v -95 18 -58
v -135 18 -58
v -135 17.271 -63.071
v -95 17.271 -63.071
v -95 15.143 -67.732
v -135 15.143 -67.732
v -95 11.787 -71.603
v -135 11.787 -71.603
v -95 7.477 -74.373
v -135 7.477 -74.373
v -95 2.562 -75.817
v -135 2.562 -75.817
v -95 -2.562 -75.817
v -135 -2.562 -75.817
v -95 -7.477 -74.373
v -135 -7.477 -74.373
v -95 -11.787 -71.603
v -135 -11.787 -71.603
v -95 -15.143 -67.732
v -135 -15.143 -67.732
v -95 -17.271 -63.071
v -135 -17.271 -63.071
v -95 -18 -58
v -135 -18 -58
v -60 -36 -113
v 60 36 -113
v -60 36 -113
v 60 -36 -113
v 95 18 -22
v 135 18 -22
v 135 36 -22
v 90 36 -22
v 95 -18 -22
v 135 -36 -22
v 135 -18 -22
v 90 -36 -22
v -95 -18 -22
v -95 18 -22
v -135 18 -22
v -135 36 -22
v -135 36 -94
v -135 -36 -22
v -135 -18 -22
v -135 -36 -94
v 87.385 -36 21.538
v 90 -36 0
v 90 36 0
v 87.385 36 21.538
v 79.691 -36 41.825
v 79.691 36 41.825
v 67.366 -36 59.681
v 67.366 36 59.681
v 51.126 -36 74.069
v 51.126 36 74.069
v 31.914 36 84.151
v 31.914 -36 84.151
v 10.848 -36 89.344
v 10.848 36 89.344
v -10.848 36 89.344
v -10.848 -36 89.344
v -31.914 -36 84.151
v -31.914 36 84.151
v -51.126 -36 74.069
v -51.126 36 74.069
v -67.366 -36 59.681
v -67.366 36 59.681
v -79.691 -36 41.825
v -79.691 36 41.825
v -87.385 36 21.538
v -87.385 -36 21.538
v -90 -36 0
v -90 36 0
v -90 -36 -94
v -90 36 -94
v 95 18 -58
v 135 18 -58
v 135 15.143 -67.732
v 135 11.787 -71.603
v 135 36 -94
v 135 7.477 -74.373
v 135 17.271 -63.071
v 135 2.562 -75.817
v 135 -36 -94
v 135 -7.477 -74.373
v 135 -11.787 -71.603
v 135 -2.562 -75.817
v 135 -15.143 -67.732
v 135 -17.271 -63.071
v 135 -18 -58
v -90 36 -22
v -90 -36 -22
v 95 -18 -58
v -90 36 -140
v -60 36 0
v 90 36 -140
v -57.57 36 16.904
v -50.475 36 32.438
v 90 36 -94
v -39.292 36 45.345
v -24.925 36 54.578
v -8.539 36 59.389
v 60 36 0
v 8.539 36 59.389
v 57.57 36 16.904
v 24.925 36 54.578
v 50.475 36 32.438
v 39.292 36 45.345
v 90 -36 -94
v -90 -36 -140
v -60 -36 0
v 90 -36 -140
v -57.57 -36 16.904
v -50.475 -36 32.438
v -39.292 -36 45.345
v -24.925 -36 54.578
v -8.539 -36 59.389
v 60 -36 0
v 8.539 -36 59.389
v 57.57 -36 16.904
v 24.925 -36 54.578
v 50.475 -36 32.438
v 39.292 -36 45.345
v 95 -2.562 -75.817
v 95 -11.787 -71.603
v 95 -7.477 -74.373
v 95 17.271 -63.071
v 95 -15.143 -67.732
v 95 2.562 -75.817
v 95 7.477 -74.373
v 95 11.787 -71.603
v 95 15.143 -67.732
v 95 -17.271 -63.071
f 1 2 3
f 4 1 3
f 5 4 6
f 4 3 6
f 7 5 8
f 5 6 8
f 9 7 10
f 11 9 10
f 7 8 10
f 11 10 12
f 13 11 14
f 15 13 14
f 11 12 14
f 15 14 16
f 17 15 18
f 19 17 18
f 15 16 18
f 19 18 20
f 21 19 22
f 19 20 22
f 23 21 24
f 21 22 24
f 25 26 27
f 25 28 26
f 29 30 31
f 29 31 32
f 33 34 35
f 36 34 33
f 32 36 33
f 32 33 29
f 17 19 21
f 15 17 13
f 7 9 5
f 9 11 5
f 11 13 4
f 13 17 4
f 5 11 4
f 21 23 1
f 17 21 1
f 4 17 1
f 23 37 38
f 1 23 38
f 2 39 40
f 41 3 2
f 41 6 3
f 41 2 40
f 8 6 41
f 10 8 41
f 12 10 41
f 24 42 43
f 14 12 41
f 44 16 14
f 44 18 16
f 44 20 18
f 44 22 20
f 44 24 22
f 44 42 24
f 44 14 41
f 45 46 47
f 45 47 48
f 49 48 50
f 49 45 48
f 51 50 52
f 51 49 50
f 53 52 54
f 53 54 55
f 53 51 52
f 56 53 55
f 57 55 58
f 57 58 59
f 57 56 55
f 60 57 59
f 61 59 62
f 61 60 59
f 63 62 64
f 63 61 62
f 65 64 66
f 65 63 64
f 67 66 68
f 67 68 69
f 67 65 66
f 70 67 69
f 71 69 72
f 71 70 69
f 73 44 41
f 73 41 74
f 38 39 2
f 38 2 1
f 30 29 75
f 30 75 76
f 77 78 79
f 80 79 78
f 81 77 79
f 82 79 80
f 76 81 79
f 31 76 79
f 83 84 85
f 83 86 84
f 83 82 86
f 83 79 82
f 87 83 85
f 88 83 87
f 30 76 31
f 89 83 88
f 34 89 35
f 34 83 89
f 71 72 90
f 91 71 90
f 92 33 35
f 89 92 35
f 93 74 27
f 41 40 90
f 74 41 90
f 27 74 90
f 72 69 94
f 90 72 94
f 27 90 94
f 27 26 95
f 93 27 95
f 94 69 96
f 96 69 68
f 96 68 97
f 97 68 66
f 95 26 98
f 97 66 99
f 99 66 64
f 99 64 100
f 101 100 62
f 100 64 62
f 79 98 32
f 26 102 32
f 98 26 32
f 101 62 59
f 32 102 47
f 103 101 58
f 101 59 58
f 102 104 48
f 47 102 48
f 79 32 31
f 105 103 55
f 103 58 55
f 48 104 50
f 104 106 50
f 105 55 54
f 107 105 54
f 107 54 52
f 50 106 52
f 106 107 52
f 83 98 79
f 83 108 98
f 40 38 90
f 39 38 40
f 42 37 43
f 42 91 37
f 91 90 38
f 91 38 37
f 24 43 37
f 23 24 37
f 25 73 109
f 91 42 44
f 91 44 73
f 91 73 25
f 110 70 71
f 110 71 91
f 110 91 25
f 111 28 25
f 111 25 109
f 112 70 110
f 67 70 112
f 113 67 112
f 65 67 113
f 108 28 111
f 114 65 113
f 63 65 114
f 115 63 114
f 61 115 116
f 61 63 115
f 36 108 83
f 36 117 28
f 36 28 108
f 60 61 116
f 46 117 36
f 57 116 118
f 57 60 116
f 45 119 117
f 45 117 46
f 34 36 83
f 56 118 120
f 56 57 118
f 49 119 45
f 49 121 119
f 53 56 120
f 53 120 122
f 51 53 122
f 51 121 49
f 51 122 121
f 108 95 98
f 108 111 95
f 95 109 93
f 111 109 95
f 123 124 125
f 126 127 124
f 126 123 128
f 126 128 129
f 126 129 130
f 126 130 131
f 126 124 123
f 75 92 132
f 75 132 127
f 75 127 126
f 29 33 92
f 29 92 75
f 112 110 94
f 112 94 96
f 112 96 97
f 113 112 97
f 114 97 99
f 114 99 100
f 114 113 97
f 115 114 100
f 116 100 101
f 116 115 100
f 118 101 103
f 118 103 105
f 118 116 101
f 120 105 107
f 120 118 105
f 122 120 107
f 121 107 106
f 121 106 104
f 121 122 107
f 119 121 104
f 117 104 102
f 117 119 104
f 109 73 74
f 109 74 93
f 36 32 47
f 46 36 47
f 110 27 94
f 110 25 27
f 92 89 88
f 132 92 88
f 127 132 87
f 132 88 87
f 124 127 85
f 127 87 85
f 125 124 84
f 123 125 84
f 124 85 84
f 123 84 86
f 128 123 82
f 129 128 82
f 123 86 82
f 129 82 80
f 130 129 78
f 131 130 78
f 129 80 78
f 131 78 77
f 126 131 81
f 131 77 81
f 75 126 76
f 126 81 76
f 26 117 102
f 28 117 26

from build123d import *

# Parameters (mm, degrees)
F1_DEPTH = 36
F2_W     = 40
F2_H     = 36
F5_DEPTH = 36
F6_DEPTH = 40
F7_DEPTH = 40


with BuildPart() as f1:
    # F0 (on Front) → F1 (new body, symmetric)
    with BuildSketch(Plane.XZ):
        with BuildLine():
            Line((90, -22), (90, 0))
            ThreePointArc((90, 0), (0, 90), (-90, 0))
            Line((-90, 0), (-90, -22))
            Line((-90, -22), (-135, -22))
            Line((-135, -22), (-135, -94))
            Line((-135, -94), (-90, -94))
            Line((-90, -94), (-90, -140))
            Line((-90, -140), (90, -140))
            Line((90, -140), (90, -94))
            Line((90, -94), (135, -94))
            Line((135, -94), (135, -22))
            Line((135, -22), (90, -22))
        make_face()
        with BuildLine():
            ThreePointArc((-60, 0), (0, 60), (60, 0))
            Line((60, 0), (60, -113))
            Line((60, -113), (-60, -113))
            Line((-60, -113), (-60, 0))
        make_face(mode=Mode.SUBTRACT)
    extrude(amount=F1_DEPTH, both=True)

    # F2 (on face) → F5 (cut)
    with BuildSketch(Plane.XY.offset(-22)):
        with Locations((-115, 0)):
            Rectangle(F2_W, F2_H)
        with Locations((115, 0)):
            Rectangle(F2_W, F2_H)
    extrude(amount=-F5_DEPTH, mode=Mode.SUBTRACT)

    # F3 (on face) → F6 (cut)
    with BuildSketch(Plane(origin=(-135, 0, 0), x_dir=(0, -1, 0), z_dir=(-1, 0, 0))):
        with BuildLine():
            Line((18, -58), (-18, -58))
            ThreePointArc((-18, -58), (0, -76), (18, -58))
        make_face()
    extrude(amount=-F6_DEPTH, mode=Mode.SUBTRACT)

    # F4 (on face) → F7 (cut)
    with BuildSketch(Plane.YZ.offset(135)):
        with BuildLine():
            ThreePointArc((-18, -58), (0, -76), (18, -58))
            Line((18, -58), (-18, -58))
        make_face()
    extrude(amount=-F7_DEPTH, mode=Mode.SUBTRACT)


solid = f1.part
